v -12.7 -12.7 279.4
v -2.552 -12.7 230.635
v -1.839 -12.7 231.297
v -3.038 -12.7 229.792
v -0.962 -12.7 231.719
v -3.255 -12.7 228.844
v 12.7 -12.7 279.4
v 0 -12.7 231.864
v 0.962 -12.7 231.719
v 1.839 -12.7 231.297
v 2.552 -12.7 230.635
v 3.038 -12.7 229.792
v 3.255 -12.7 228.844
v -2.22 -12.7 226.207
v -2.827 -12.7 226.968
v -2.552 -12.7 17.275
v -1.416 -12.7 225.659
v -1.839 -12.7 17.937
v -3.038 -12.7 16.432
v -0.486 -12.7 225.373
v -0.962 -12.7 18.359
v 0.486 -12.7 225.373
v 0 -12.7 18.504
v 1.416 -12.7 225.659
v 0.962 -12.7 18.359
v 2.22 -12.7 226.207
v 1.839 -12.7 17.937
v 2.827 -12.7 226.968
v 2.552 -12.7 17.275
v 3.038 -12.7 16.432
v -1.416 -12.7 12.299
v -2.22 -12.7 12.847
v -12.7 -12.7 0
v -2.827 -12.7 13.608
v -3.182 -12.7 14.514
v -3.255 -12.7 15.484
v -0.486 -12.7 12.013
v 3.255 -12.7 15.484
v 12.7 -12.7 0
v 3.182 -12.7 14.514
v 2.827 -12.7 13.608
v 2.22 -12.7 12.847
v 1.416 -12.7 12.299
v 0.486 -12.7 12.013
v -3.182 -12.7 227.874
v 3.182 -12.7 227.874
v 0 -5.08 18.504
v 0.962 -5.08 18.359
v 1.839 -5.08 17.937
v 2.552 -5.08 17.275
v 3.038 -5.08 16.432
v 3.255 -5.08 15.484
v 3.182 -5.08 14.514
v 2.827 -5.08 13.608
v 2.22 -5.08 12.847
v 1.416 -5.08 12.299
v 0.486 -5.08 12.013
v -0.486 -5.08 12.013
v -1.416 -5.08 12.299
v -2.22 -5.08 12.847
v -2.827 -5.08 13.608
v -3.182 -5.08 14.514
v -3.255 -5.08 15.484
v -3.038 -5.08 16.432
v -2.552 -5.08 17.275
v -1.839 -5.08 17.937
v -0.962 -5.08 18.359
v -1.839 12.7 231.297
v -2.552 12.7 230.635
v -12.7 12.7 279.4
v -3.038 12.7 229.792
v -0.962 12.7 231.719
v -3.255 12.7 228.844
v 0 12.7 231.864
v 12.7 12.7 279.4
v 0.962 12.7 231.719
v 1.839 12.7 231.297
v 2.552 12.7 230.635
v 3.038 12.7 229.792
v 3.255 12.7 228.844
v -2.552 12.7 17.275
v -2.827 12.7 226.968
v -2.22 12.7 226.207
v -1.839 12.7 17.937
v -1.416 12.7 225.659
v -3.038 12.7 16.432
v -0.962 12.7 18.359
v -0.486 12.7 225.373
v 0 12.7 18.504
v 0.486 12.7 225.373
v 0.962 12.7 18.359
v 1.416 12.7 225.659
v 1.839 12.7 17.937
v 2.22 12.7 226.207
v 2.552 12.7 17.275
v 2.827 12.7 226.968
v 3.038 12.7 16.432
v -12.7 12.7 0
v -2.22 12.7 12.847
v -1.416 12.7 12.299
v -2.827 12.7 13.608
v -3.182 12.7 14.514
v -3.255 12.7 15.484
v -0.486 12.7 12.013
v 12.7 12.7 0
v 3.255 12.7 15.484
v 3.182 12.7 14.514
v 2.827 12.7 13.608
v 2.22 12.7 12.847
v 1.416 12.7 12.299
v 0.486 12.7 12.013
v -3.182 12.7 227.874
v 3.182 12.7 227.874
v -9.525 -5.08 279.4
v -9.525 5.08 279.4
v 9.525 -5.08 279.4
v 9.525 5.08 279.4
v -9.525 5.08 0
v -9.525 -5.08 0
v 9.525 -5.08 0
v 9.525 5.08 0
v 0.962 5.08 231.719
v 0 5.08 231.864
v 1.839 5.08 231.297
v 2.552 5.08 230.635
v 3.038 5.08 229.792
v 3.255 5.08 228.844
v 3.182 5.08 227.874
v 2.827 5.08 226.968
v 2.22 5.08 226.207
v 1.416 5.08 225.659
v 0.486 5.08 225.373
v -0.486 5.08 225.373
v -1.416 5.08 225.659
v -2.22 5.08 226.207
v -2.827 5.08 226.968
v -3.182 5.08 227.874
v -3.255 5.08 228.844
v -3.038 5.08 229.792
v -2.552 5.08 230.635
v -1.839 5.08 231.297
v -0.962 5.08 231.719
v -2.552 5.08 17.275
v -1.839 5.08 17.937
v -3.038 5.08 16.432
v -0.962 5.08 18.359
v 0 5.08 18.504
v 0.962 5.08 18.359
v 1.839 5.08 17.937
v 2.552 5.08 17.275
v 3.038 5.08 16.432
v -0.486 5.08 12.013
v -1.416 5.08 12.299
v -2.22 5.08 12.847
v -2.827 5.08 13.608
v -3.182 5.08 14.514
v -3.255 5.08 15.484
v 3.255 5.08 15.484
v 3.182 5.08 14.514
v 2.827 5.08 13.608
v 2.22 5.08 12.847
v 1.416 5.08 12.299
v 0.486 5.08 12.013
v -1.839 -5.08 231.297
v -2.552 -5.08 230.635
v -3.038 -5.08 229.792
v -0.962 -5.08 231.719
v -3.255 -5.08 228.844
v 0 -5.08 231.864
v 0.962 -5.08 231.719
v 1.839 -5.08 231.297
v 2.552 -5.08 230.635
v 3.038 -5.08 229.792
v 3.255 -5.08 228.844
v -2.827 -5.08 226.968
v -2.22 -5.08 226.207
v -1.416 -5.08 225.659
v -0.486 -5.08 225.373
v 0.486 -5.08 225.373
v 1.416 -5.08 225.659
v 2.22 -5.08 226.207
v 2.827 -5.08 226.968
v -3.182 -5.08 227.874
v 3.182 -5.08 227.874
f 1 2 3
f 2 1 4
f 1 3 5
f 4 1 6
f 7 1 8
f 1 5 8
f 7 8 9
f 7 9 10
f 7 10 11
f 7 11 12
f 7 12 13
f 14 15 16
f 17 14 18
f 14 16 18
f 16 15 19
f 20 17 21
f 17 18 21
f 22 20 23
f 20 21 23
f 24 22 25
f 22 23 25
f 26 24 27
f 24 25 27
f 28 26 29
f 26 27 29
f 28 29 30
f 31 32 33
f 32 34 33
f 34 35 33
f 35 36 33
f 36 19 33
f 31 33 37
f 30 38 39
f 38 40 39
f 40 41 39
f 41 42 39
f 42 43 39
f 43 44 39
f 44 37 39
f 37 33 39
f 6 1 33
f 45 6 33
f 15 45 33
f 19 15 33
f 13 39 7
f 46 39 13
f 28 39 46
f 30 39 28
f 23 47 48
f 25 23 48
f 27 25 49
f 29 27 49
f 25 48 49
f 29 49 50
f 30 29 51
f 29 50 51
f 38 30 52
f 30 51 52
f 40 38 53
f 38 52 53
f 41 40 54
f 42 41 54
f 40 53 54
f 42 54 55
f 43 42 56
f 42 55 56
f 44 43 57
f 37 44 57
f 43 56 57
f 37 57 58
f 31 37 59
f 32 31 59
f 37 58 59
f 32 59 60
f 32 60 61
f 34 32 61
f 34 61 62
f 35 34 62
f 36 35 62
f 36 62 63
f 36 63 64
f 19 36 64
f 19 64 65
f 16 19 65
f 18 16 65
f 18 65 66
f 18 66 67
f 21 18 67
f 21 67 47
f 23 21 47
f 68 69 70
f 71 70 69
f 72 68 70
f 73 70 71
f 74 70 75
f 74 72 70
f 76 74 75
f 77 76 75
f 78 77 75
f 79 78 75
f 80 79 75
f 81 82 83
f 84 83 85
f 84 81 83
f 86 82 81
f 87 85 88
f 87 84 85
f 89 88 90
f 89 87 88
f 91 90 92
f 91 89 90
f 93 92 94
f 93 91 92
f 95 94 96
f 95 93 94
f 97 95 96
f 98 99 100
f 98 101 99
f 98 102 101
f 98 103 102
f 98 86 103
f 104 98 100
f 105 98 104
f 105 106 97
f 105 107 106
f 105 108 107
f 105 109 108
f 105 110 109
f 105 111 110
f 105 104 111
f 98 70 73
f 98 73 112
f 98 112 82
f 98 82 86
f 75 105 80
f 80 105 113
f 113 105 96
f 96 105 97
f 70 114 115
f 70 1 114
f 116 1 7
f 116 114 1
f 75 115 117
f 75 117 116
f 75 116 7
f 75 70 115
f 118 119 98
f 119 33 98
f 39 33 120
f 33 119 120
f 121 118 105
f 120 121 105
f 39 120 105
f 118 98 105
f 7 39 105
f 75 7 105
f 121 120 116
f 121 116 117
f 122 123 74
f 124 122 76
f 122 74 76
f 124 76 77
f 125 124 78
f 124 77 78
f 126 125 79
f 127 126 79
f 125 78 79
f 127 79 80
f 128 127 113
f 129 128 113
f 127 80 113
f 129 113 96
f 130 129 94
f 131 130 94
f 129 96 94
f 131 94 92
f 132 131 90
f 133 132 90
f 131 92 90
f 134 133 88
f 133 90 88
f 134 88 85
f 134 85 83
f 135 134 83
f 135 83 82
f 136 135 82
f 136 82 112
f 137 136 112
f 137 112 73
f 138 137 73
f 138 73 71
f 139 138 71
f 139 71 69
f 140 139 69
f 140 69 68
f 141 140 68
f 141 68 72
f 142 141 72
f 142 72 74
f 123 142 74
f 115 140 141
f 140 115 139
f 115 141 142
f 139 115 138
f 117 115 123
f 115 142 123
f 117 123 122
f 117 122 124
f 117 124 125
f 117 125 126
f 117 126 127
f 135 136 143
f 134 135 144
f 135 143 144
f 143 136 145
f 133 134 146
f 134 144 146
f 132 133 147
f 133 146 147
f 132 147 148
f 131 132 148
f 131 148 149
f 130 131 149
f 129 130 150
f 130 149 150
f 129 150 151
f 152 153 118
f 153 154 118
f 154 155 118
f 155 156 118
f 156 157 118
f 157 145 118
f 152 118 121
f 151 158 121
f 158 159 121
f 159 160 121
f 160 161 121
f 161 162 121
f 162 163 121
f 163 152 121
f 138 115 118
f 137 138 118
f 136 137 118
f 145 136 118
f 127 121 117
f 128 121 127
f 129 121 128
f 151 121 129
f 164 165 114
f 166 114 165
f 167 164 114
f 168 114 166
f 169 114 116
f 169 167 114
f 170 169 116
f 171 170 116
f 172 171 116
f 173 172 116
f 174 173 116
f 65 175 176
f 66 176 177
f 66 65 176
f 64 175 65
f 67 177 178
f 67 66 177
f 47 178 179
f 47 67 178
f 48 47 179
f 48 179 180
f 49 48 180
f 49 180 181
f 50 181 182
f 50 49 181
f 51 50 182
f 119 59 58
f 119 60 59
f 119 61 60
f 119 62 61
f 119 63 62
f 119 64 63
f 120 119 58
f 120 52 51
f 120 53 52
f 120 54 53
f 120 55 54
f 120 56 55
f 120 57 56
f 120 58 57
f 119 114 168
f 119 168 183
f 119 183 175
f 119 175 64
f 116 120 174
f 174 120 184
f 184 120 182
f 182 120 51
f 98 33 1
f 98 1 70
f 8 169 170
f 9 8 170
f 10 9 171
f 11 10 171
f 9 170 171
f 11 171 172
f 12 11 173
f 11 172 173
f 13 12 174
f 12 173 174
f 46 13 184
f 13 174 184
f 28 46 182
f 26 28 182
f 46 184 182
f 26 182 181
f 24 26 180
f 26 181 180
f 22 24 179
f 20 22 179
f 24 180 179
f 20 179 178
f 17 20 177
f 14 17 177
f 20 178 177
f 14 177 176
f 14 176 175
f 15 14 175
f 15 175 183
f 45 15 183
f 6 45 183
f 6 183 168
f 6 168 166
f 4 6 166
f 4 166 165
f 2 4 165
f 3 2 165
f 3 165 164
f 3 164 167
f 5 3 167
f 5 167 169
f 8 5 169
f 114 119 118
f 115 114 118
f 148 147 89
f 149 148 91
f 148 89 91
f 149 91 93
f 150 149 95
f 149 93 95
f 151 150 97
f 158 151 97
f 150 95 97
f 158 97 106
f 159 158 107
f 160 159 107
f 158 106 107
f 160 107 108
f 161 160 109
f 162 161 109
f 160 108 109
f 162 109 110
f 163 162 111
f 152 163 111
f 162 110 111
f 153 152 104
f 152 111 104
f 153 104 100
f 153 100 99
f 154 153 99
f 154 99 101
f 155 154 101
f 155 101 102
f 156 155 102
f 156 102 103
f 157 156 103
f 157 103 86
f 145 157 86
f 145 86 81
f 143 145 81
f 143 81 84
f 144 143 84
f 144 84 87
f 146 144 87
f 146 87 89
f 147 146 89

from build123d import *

# Parameters (mm, degrees)
SKETCH2_W           = 25.4
SKETCH2_H           = 25.4
BOSS_EXTRUDE1_DEPTH = 279.4
SKETCH4_W           = 19.05
SKETCH4_H           = 10.16
CUT_EXTRUDE1_DEPTH  = 280.9766776
SKETCH5_R           = 3.2639
CUT_EXTRUDE2_DEPTH  = 281.839473721
SKETCH6_R           = 3.2639
CUT_EXTRUDE3_DEPTH  = 281.839473721


with BuildPart() as part:
    # Sketch2 → Boss-Extrude1 (new body)
    with BuildSketch(Plane.XY):
        Rectangle(SKETCH2_W, SKETCH2_H)
    extrude(amount=BOSS_EXTRUDE1_DEPTH)

    # Sketch4 → Cut-Extrude1 (cut, through all)
    with BuildSketch(Plane.XY):
        Rectangle(SKETCH4_W, SKETCH4_H)
    extrude(amount=CUT_EXTRUDE1_DEPTH, mode=Mode.SUBTRACT)

    # Sketch5 → Cut-Extrude2 (cut, through all)
    with BuildSketch(Plane(origin=(0, 12.7, 0), x_dir=(1, 0, 0), z_dir=(0, 1, 0))):
        with Locations(Location((0, -15.24, 0), (0, 0, 270))):
            Circle(SKETCH5_R)
    extrude(amount=-CUT_EXTRUDE2_DEPTH, mode=Mode.SUBTRACT)

    # Sketch6 → Cut-Extrude3 (cut, through all)
    with BuildSketch(Plane(origin=(0, 12.7, 0), x_dir=(1, 0, 0), z_dir=(0, 1, 0))):
        with Locations(Location((0, -228.6, 0), (0, 0, 270))):
            Circle(SKETCH6_R)
    extrude(amount=-CUT_EXTRUDE3_DEPTH, mode=Mode.SUBTRACT)


solid = part.part
